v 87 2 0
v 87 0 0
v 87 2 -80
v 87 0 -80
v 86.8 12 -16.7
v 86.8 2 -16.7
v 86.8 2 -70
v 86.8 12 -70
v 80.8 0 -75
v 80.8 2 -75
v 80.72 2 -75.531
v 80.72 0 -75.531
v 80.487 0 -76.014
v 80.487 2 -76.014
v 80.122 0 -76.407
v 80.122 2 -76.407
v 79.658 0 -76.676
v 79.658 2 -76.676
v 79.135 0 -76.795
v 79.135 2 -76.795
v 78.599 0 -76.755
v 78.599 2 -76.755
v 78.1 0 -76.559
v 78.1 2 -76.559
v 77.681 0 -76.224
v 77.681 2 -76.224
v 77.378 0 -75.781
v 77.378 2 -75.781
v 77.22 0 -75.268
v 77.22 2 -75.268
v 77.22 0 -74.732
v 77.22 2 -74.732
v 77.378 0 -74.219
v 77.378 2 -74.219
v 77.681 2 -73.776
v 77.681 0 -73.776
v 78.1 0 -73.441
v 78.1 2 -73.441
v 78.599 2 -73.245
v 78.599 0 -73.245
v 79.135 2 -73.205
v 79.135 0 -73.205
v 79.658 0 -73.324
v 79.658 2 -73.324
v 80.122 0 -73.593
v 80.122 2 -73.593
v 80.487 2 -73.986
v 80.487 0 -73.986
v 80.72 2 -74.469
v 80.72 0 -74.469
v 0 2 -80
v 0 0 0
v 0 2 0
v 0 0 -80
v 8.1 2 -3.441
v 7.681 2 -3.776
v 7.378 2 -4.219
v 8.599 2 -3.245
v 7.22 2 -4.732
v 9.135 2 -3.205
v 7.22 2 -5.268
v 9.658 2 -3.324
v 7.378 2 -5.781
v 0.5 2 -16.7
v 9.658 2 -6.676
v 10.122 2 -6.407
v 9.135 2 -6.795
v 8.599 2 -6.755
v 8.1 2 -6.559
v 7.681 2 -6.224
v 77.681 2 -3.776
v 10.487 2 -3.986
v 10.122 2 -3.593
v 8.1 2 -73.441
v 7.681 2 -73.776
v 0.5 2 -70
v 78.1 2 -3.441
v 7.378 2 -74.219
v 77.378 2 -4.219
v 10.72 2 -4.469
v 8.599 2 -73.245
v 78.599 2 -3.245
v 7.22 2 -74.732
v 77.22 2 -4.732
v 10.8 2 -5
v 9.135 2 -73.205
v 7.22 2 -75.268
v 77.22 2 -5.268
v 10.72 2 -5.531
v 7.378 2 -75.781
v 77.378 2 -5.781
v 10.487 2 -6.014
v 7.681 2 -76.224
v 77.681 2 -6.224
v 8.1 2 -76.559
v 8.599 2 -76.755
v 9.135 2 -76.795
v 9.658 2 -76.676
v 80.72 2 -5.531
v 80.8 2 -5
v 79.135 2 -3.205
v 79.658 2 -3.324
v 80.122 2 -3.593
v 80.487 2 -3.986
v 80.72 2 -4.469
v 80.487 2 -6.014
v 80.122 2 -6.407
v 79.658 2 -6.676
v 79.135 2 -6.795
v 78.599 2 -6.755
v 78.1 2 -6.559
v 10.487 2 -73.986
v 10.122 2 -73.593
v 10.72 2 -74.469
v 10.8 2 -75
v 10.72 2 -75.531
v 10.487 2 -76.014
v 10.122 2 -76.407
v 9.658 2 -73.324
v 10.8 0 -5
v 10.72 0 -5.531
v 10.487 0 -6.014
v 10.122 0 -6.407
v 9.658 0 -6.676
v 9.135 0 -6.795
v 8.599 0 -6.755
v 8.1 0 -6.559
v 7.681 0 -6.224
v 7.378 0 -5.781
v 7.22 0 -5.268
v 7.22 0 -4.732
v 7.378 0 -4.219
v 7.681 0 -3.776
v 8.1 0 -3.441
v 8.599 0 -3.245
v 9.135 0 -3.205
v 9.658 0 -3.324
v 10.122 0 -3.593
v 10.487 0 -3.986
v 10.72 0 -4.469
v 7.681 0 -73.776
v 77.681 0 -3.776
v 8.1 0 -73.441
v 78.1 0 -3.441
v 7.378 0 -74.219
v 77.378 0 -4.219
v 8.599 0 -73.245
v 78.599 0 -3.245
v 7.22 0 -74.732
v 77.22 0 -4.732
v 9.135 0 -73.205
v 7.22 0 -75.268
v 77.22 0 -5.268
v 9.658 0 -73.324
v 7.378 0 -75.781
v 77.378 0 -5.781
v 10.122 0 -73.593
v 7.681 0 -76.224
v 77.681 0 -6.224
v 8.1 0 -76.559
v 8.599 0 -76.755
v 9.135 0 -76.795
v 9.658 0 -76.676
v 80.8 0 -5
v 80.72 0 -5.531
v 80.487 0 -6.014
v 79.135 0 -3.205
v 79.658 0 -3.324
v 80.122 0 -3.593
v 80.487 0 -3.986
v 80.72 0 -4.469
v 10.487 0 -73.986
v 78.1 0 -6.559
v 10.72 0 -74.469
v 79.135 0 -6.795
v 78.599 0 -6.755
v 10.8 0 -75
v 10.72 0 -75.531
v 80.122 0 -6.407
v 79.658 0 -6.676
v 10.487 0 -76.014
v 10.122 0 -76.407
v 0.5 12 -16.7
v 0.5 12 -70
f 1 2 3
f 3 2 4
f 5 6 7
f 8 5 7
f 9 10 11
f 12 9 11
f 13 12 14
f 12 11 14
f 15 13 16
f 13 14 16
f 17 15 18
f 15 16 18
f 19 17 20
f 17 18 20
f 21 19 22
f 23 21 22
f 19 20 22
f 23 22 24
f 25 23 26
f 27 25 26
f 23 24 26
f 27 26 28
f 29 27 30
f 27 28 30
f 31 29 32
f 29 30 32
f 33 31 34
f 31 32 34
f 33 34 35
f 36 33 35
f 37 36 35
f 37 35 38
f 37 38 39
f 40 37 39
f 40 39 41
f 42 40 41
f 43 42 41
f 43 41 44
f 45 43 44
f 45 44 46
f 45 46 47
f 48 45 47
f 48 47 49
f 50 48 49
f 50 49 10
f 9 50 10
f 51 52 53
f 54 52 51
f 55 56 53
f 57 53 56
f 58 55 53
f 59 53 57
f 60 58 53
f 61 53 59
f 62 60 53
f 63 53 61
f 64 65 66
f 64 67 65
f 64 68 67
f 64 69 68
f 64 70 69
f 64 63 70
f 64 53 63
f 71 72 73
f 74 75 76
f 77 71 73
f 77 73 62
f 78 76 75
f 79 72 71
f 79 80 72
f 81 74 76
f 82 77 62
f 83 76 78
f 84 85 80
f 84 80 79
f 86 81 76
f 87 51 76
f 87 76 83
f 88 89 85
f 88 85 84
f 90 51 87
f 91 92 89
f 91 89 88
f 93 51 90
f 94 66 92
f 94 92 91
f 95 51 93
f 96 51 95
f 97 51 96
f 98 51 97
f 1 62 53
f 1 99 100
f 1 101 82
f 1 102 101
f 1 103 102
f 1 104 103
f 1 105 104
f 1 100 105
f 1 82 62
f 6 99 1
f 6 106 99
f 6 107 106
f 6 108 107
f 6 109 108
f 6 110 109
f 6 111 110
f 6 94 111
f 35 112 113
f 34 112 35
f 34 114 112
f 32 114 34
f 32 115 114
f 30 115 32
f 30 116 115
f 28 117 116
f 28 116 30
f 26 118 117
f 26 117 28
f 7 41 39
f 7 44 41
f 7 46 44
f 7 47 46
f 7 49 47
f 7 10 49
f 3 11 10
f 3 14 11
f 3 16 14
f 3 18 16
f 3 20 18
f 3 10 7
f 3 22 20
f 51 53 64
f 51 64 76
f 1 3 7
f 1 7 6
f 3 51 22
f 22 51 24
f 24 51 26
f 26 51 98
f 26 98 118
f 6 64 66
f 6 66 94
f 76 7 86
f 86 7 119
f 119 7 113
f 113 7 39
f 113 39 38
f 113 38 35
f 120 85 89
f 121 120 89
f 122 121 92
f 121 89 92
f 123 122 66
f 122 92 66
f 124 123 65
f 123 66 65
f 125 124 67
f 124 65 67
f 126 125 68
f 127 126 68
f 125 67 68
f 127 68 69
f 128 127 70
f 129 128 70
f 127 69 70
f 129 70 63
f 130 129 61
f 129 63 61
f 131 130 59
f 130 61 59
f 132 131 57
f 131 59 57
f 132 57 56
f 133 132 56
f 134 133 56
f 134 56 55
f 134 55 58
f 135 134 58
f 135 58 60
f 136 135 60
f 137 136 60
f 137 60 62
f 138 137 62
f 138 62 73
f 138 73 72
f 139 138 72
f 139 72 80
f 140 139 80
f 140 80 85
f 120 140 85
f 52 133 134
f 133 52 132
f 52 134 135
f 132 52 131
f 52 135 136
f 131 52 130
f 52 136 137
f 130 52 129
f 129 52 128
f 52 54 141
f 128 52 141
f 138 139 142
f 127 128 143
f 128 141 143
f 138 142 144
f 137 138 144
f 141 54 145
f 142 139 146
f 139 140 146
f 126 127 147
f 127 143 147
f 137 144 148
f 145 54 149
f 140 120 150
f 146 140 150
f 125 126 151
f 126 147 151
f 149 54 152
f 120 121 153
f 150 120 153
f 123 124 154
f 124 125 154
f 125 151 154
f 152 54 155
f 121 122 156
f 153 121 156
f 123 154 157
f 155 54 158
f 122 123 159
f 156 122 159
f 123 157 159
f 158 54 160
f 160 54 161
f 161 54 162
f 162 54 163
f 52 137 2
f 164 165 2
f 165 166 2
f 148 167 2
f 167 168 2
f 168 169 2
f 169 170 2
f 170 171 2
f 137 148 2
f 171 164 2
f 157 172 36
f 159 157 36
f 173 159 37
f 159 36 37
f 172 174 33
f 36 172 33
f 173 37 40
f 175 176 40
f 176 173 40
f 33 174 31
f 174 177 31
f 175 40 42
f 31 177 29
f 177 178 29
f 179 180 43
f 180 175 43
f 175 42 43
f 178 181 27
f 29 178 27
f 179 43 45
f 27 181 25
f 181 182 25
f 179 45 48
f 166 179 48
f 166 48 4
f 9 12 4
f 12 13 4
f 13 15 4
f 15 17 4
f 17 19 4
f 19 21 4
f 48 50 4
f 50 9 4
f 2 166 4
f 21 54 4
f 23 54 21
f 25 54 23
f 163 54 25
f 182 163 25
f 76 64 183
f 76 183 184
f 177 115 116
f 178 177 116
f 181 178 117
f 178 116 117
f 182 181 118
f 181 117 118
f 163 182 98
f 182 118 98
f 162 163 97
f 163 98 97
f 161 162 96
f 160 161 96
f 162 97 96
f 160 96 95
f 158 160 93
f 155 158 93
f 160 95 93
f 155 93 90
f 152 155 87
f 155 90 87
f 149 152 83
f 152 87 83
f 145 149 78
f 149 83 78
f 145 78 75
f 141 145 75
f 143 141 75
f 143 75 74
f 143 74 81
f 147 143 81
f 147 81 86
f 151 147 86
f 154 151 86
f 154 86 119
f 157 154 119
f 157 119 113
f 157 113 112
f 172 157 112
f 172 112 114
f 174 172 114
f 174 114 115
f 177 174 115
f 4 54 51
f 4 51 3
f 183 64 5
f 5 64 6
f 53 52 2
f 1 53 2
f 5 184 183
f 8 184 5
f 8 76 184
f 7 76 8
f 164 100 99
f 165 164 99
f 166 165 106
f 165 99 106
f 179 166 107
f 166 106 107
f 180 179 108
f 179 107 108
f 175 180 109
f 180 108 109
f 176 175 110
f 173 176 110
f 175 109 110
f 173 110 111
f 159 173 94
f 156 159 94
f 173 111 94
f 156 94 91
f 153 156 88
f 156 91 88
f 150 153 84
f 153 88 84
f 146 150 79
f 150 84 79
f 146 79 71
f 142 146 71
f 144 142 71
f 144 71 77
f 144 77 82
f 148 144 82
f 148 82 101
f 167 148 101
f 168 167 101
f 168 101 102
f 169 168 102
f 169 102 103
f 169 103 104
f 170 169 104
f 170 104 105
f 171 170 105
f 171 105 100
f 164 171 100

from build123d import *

# Parameters (mm, degrees)
SKETCH1_W              = 87
SKETCH1_H              = 80
PCB_DEPTH              = 2
SKETCH2_R              = 1.8
ATTACHMENT_HOLES_DEPTH = 3
LPATTERN1_COUNT        = 2
LPATTERN1_PITCH        = 70
LPATTERN1_COUNT_DIR2   = 2
LPATTERN1_PITCH_DIR2   = 70
SKETCH3_W              = 86.3
SKETCH3_H              = 53.3
IDUINO_DEPTH           = 10


with BuildPart() as part:
    # Sketch1 → PCB (new body)
    with BuildSketch(Plane(origin=(0, 0, 0), x_dir=(1, 0, 0), z_dir=(0, 1, 0))):
        with Locations((43.5, 40)):
            Rectangle(SKETCH1_W, SKETCH1_H)
    extrude(amount=PCB_DEPTH)

    # Sketch2 → Attachment Holes (cut, through all)
    with BuildSketch(Plane(origin=(0, 2, 0), x_dir=(1, 0, 0), z_dir=(0, 1, 0))):
        with Locations((9, 75)):
            Circle(SKETCH2_R)
    attachment_holes = extrude(amount=-ATTACHMENT_HOLES_DEPTH, mode=Mode.SUBTRACT)

    # LPattern1: Attachment Holes 2 × 2
    with Locations(*[(i * LPATTERN1_PITCH, 0, j * LPATTERN1_PITCH_DIR2) for i in range(LPATTERN1_COUNT) for j in range(LPATTERN1_COUNT_DIR2) if (i, j) != (0, 0)]):
        add(attachment_holes, mode=Mode.SUBTRACT)

    # Sketch3 → Iduino (add)
    with BuildSketch(Plane(origin=(0, 2, 0), x_dir=(1, 0, 0), z_dir=(0, 1, 0))):
        with Locations((43.65, 43.35)):
            Rectangle(SKETCH3_W, SKETCH3_H)
    extrude(amount=IDUINO_DEPTH)


solid = part.part
